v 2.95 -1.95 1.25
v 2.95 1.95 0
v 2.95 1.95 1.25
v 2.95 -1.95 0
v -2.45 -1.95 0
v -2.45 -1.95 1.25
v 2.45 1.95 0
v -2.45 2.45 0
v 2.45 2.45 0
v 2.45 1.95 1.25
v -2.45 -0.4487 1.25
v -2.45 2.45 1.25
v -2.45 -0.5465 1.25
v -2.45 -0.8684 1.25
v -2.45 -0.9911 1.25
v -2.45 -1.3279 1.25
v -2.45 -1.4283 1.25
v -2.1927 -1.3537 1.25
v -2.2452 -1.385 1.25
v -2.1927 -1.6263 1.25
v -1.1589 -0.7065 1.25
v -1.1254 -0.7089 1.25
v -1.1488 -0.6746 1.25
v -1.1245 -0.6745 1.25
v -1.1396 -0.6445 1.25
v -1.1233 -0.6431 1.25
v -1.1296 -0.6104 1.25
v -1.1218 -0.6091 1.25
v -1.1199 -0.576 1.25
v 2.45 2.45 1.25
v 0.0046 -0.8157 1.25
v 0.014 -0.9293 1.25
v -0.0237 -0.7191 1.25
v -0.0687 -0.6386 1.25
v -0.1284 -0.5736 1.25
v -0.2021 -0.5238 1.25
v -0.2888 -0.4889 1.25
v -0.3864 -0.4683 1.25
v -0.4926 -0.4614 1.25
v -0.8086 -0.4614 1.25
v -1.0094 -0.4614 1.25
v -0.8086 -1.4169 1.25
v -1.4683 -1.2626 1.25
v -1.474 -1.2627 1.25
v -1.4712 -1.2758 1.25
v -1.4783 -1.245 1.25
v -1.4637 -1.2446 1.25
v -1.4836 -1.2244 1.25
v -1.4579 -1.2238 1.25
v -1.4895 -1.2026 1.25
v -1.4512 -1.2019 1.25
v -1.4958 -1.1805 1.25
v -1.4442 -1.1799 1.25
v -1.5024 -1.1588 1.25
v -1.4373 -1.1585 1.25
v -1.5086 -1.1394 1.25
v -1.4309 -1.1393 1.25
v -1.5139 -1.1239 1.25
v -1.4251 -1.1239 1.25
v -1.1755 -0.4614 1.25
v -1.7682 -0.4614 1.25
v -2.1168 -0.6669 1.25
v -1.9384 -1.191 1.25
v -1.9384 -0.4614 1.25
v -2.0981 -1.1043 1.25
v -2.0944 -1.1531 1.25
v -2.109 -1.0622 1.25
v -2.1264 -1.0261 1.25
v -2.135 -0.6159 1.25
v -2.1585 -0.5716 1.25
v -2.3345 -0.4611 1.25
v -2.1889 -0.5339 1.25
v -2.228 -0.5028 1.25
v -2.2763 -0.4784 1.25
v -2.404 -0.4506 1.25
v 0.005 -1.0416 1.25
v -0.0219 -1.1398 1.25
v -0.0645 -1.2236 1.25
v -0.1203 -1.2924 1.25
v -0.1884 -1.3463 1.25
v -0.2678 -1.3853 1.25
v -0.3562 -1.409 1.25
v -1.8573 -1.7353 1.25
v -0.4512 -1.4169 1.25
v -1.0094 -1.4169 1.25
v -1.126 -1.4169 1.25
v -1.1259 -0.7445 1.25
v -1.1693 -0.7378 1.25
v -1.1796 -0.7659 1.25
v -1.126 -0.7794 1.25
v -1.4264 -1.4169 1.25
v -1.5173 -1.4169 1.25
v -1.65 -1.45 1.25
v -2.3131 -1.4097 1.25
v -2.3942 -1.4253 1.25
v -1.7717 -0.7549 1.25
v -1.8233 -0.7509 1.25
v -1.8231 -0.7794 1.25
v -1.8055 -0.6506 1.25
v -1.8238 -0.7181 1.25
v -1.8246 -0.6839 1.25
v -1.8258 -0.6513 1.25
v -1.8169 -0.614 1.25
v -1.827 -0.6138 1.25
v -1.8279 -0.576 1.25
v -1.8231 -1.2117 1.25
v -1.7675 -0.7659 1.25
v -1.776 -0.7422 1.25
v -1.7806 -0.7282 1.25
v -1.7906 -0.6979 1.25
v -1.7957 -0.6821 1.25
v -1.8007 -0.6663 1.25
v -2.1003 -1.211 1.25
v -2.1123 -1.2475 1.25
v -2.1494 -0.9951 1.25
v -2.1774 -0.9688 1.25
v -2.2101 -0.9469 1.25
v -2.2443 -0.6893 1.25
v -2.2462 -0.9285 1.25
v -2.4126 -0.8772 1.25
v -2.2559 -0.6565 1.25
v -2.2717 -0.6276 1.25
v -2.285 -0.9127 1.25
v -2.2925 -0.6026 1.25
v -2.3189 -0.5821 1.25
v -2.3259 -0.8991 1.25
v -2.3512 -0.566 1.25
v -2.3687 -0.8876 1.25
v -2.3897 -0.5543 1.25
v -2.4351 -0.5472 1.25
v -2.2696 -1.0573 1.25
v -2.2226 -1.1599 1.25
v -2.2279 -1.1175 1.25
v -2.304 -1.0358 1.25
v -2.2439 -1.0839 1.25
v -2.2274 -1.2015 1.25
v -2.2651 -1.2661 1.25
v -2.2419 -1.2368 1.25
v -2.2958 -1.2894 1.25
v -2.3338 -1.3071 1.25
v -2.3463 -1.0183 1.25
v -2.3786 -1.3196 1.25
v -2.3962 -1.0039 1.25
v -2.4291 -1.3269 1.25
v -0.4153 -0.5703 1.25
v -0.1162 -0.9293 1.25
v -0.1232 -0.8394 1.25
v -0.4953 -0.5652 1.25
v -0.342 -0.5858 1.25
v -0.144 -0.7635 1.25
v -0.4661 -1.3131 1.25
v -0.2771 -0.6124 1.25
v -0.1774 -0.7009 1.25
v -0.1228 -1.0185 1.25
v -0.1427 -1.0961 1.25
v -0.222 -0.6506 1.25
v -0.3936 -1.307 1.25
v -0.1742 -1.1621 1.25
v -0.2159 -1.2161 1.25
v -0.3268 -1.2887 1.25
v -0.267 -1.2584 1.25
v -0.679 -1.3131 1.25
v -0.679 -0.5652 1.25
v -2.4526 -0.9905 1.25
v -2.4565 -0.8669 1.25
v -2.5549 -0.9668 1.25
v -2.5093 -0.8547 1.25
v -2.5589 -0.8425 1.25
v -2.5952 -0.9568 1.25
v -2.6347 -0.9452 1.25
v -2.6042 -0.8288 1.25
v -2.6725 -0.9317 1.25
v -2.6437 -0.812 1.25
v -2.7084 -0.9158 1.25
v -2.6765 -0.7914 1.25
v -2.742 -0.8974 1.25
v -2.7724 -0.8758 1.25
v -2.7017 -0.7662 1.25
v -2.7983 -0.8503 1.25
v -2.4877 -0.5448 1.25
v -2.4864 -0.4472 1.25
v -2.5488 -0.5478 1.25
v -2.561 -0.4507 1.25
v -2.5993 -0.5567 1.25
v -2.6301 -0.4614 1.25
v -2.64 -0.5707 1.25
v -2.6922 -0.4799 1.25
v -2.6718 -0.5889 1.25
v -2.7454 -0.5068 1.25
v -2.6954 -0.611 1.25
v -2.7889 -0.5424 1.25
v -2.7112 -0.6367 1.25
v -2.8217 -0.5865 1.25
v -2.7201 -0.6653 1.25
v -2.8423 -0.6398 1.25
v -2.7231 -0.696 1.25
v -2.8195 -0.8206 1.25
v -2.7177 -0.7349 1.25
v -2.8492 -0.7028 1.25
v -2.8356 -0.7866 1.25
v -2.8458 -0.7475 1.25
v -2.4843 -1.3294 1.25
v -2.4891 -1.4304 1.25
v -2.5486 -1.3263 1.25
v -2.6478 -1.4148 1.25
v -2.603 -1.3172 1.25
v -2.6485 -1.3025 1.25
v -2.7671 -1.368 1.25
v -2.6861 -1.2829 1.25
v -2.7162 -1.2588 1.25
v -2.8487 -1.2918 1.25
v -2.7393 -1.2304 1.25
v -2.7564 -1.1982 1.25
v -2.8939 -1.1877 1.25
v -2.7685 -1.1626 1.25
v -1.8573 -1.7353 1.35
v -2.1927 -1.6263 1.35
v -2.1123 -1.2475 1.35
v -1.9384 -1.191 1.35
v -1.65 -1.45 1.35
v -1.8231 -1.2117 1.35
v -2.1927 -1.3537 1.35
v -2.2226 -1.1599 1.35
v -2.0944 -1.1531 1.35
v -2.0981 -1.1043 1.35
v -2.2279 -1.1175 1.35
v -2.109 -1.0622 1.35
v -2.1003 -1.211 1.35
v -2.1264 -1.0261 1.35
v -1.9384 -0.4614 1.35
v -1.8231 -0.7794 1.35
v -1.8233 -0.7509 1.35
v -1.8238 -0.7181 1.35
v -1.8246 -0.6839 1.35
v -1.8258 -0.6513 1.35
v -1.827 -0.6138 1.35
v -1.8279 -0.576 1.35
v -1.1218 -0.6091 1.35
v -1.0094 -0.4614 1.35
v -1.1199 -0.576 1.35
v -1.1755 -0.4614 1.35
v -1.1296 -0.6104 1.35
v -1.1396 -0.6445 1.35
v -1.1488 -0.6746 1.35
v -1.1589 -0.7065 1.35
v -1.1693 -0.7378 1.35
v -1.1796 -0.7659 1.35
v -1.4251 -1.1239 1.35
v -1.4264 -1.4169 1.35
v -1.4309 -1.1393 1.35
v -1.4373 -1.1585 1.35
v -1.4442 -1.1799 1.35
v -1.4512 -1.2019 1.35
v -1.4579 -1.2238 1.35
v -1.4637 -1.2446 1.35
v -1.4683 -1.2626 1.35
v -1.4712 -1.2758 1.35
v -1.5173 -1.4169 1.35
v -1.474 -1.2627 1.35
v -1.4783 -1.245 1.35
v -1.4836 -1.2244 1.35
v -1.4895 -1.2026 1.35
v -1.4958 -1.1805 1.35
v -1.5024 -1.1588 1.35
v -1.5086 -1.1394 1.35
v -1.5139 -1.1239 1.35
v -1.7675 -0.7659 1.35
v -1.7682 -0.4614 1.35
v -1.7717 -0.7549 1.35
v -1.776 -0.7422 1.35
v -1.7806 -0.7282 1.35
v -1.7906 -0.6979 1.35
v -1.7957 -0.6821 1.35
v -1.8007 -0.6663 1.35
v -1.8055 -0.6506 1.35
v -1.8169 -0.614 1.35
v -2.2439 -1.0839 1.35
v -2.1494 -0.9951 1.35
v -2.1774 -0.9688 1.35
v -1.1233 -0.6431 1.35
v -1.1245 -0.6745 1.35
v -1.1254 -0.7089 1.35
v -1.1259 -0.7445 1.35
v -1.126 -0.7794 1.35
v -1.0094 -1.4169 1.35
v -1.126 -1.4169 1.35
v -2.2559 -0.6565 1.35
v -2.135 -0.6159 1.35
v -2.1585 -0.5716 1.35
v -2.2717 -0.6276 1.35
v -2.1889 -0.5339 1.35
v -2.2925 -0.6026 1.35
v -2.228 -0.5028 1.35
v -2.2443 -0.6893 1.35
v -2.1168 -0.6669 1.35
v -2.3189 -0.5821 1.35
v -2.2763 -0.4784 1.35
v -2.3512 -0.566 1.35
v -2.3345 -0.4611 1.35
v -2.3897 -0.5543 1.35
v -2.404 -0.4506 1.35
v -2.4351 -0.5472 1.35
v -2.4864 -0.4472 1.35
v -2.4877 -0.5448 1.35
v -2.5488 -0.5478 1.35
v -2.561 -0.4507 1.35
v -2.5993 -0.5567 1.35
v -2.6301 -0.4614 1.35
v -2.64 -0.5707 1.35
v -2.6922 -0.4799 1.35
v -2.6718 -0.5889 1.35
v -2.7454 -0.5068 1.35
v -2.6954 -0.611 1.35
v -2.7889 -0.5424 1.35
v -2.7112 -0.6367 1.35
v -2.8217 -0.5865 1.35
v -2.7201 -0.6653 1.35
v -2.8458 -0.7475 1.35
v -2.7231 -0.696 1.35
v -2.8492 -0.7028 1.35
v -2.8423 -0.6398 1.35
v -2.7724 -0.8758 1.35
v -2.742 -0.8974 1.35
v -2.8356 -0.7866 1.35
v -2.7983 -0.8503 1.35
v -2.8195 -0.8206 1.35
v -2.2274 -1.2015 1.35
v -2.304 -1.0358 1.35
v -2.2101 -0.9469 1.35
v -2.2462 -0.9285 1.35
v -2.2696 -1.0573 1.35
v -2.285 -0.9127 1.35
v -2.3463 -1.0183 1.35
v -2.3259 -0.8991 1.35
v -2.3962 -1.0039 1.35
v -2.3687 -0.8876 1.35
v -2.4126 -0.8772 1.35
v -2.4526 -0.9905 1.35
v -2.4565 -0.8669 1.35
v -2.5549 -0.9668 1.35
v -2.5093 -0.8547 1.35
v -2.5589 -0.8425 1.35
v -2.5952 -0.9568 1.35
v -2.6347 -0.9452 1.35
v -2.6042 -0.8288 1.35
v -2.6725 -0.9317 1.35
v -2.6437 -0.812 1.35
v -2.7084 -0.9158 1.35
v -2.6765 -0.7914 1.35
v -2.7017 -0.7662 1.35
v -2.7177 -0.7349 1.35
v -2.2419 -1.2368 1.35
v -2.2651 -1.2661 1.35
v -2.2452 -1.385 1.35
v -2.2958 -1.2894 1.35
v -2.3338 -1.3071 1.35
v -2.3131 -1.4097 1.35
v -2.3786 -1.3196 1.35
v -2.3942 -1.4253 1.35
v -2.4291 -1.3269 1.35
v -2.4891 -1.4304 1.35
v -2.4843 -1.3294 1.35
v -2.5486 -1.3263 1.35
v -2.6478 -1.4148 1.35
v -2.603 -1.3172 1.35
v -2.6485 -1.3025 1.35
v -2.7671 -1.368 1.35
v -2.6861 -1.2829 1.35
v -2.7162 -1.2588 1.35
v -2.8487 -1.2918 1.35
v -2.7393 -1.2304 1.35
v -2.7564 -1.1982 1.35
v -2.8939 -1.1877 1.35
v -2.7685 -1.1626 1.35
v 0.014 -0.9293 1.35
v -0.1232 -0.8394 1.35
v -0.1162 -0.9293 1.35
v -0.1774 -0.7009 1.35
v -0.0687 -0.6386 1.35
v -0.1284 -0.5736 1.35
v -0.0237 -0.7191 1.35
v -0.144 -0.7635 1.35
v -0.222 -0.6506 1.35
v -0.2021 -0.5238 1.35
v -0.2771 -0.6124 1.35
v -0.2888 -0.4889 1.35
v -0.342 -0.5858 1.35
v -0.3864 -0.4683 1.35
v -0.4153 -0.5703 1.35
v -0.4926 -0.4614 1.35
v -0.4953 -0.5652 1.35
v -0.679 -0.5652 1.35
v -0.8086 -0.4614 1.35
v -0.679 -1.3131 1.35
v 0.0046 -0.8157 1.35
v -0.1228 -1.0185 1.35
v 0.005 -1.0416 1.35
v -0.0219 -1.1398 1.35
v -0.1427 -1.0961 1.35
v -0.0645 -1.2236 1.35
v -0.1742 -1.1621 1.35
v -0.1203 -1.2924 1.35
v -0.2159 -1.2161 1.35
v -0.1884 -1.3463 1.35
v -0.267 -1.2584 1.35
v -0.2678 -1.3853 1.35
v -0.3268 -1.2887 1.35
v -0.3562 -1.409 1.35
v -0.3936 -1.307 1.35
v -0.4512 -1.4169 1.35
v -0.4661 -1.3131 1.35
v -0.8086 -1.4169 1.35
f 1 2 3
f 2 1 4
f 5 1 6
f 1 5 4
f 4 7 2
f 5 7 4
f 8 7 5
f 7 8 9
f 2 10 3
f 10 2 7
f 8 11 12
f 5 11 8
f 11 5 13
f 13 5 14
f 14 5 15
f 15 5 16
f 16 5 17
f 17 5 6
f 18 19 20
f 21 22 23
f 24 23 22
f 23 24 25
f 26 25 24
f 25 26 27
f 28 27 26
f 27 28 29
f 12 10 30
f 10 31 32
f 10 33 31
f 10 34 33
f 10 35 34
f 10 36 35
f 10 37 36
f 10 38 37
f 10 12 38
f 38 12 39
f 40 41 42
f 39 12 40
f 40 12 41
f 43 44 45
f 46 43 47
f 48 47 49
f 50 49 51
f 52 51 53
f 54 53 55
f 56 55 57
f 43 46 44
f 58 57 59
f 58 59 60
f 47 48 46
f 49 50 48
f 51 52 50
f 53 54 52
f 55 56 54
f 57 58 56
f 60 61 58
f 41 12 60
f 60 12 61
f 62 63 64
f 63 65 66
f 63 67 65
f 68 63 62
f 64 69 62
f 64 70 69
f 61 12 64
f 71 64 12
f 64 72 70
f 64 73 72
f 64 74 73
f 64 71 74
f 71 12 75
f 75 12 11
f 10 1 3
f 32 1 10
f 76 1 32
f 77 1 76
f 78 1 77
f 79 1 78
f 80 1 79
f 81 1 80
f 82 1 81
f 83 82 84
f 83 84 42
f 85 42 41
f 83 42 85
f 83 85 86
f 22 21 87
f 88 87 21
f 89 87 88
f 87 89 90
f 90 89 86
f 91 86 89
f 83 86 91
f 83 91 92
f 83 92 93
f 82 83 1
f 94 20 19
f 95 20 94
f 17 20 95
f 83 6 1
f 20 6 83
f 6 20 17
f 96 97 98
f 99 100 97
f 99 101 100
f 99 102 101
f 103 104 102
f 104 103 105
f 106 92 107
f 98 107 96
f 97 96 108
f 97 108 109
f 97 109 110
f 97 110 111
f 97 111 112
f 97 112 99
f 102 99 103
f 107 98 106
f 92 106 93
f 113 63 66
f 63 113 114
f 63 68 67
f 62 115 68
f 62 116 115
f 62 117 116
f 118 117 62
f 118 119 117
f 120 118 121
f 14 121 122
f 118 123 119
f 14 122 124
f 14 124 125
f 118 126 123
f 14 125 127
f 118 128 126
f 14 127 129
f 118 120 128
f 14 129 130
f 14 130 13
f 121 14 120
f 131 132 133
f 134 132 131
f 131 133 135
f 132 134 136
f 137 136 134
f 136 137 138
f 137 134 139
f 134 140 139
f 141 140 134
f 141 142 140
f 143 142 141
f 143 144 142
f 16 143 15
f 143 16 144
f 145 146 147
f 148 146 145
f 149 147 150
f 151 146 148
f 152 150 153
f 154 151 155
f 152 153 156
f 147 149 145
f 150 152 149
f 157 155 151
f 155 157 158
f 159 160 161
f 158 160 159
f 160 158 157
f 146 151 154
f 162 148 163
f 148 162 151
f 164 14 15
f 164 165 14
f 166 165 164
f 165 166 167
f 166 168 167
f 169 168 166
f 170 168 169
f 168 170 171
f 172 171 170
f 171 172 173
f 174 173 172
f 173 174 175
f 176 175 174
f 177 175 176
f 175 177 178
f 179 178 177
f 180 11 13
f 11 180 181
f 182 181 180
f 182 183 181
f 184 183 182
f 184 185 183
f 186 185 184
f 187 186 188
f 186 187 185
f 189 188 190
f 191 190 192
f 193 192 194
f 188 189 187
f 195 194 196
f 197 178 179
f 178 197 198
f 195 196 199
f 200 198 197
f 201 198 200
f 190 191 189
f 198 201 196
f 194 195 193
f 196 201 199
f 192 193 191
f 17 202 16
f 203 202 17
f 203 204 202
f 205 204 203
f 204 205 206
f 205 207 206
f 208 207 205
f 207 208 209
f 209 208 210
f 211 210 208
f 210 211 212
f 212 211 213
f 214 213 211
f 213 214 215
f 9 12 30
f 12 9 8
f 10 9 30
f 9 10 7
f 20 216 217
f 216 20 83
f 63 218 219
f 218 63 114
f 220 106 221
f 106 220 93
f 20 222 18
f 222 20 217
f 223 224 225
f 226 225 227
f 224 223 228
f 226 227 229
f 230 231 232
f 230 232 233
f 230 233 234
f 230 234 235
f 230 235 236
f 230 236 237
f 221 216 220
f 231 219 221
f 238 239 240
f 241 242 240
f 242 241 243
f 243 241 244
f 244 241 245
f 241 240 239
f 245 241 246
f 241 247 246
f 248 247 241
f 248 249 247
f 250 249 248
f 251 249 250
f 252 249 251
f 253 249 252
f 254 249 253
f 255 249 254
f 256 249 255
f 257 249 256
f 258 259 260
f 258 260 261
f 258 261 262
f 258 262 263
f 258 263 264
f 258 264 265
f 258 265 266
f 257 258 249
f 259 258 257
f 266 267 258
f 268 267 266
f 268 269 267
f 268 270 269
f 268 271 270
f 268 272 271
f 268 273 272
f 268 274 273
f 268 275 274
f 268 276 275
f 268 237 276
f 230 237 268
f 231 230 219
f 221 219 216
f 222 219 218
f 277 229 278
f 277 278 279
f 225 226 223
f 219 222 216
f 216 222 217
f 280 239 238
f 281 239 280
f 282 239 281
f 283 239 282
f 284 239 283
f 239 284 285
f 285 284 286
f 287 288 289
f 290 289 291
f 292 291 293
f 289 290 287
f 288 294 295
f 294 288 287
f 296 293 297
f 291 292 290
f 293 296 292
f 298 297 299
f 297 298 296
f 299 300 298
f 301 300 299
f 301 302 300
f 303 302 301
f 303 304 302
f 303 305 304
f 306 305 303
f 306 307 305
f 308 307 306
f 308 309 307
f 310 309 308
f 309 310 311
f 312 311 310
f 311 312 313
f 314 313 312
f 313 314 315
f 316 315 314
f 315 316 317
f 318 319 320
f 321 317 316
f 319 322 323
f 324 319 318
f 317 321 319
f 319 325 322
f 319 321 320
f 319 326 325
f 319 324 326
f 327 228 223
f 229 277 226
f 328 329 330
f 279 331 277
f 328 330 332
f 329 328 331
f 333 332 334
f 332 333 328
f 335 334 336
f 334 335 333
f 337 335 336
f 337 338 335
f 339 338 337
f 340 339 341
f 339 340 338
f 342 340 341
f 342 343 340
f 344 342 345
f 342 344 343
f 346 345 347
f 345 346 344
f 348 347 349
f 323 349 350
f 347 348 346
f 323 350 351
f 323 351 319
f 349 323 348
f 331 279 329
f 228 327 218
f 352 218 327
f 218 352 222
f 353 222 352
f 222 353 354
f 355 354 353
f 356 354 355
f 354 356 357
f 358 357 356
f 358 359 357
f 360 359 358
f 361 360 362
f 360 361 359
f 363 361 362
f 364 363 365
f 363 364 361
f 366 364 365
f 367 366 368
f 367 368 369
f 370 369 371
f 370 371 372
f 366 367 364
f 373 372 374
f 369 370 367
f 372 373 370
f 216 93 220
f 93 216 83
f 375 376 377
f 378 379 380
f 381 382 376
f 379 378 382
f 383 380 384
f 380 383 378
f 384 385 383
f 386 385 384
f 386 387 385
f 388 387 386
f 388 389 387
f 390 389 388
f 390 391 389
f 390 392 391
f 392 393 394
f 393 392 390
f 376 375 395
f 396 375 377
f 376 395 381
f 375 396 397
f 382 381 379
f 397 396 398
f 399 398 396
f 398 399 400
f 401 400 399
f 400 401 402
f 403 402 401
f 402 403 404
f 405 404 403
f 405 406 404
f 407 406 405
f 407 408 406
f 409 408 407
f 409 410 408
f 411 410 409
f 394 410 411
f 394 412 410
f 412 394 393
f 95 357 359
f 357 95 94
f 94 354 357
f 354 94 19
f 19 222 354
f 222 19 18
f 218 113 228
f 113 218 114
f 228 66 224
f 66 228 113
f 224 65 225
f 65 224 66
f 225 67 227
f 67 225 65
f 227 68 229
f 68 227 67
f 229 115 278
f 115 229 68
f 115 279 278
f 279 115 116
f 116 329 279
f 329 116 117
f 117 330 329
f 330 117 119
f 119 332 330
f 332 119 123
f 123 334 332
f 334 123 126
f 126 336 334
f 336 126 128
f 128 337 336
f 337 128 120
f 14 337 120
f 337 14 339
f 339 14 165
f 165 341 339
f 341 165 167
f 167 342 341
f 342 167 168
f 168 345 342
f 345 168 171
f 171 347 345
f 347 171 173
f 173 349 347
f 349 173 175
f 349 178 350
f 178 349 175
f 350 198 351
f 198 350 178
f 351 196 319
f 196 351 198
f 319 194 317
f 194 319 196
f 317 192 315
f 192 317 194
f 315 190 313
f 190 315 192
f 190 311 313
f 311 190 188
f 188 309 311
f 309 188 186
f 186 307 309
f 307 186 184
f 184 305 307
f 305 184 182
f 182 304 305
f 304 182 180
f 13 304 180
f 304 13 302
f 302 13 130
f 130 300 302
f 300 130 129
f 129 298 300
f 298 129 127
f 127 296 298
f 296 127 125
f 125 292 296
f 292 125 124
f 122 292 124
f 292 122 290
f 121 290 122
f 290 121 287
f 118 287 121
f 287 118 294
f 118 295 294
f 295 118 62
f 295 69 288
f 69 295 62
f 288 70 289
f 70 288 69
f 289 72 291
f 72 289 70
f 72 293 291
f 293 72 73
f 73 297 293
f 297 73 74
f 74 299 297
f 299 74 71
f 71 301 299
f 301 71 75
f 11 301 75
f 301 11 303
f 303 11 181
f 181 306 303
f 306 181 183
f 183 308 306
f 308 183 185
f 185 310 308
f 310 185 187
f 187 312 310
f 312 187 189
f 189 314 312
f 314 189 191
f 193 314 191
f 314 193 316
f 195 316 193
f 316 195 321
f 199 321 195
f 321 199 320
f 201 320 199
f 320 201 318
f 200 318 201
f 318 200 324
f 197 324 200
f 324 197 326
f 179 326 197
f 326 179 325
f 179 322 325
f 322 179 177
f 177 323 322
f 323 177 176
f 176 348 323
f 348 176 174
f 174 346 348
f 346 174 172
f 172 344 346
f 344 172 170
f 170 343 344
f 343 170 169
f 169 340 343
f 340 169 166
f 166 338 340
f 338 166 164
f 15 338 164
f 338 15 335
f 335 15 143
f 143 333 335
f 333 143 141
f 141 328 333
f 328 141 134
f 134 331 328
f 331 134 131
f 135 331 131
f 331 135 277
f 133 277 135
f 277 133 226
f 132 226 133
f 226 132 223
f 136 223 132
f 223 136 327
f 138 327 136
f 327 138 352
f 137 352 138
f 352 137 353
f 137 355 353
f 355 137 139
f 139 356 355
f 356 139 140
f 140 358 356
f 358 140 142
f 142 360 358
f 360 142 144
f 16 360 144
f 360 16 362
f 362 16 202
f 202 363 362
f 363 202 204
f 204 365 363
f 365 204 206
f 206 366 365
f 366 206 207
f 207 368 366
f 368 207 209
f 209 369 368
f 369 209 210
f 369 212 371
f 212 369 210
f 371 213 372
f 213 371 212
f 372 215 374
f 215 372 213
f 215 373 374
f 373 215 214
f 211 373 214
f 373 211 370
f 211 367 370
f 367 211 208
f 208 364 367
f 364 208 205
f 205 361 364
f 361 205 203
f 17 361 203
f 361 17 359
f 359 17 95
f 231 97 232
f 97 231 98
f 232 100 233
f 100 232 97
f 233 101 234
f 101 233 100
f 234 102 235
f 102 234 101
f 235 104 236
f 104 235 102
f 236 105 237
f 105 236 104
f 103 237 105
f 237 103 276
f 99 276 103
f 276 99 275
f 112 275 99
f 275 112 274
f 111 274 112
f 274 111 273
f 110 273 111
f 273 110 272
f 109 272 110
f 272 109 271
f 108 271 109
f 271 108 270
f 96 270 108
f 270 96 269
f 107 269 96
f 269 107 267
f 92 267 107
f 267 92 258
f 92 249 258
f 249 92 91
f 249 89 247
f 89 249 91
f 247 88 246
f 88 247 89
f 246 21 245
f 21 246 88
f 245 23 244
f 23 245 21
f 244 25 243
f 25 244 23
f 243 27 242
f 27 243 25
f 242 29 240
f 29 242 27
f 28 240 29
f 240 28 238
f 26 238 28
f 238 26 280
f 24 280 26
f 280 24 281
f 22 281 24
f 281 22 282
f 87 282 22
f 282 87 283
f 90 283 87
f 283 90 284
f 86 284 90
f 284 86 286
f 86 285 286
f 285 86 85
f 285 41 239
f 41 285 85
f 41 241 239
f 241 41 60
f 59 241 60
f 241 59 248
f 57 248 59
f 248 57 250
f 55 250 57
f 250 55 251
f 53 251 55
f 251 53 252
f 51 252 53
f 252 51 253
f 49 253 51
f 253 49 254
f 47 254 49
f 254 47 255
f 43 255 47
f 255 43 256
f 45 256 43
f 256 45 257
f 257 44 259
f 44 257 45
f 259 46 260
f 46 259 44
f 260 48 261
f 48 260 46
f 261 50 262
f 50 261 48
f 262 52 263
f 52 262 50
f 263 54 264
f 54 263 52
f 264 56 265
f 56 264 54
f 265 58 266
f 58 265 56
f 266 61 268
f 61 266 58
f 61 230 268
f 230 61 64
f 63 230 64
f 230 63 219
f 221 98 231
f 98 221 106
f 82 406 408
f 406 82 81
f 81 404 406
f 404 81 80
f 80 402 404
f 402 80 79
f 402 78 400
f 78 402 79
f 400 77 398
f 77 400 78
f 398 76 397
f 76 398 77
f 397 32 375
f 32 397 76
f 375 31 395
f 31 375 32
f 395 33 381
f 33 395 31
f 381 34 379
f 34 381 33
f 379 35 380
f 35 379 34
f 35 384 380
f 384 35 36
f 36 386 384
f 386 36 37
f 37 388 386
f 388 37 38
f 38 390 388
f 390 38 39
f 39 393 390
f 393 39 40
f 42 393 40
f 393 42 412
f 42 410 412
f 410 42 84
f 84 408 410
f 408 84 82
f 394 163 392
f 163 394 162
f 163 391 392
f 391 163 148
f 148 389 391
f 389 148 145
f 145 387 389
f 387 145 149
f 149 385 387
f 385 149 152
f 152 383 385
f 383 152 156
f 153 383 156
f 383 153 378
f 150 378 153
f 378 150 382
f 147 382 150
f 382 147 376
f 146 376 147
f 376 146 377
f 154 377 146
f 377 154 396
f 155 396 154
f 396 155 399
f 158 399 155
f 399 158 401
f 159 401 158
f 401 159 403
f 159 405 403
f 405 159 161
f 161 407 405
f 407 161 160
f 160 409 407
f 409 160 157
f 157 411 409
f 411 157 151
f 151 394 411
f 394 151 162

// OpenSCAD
module smd_package() {
    smd_body();
    pin_1_mark();
    side_chamfers();
    top_marking_text();
}

module smd_body() {
    translate([-4.90/2, -3.90/2, 0])
        cube([4.90, 3.90, 1.25]);
}

module pin_1_mark() {
    translate([-4.90/2 + 0.5, -3.90/2 + 0.5, 1.25])
        cylinder(h = 0.1, r = 0.3);
}

module side_chamfers() {
    // Chamfer on the length sides
    translate([-4.90/2, -3.90/2, 0])
        hull() {
            translate([0, 0, 0])
                cube([0.5, 3.90, 1.25]);
            translate([4.90, 0, 0])
                cube([0.5, 3.90, 1.25]);
        }
    // Chamfer on the width sides
    translate([-4.90/2, -3.90/2, 0])
        hull() {
            translate([0, 0, 0])
                cube([4.90, 0.5, 1.25]);
            translate([0, 3.90, 0])
                cube([4.90, 0.5, 1.25]);
        }
}

module top_marking_text() {
    translate([-4.90/2 + 1, -3.90/2 + 1, 1.25])
        linear_extrude(height = 0.1)
            text("SMD", size = 1, valign = "center", halign = "center");
}

smd_package();
